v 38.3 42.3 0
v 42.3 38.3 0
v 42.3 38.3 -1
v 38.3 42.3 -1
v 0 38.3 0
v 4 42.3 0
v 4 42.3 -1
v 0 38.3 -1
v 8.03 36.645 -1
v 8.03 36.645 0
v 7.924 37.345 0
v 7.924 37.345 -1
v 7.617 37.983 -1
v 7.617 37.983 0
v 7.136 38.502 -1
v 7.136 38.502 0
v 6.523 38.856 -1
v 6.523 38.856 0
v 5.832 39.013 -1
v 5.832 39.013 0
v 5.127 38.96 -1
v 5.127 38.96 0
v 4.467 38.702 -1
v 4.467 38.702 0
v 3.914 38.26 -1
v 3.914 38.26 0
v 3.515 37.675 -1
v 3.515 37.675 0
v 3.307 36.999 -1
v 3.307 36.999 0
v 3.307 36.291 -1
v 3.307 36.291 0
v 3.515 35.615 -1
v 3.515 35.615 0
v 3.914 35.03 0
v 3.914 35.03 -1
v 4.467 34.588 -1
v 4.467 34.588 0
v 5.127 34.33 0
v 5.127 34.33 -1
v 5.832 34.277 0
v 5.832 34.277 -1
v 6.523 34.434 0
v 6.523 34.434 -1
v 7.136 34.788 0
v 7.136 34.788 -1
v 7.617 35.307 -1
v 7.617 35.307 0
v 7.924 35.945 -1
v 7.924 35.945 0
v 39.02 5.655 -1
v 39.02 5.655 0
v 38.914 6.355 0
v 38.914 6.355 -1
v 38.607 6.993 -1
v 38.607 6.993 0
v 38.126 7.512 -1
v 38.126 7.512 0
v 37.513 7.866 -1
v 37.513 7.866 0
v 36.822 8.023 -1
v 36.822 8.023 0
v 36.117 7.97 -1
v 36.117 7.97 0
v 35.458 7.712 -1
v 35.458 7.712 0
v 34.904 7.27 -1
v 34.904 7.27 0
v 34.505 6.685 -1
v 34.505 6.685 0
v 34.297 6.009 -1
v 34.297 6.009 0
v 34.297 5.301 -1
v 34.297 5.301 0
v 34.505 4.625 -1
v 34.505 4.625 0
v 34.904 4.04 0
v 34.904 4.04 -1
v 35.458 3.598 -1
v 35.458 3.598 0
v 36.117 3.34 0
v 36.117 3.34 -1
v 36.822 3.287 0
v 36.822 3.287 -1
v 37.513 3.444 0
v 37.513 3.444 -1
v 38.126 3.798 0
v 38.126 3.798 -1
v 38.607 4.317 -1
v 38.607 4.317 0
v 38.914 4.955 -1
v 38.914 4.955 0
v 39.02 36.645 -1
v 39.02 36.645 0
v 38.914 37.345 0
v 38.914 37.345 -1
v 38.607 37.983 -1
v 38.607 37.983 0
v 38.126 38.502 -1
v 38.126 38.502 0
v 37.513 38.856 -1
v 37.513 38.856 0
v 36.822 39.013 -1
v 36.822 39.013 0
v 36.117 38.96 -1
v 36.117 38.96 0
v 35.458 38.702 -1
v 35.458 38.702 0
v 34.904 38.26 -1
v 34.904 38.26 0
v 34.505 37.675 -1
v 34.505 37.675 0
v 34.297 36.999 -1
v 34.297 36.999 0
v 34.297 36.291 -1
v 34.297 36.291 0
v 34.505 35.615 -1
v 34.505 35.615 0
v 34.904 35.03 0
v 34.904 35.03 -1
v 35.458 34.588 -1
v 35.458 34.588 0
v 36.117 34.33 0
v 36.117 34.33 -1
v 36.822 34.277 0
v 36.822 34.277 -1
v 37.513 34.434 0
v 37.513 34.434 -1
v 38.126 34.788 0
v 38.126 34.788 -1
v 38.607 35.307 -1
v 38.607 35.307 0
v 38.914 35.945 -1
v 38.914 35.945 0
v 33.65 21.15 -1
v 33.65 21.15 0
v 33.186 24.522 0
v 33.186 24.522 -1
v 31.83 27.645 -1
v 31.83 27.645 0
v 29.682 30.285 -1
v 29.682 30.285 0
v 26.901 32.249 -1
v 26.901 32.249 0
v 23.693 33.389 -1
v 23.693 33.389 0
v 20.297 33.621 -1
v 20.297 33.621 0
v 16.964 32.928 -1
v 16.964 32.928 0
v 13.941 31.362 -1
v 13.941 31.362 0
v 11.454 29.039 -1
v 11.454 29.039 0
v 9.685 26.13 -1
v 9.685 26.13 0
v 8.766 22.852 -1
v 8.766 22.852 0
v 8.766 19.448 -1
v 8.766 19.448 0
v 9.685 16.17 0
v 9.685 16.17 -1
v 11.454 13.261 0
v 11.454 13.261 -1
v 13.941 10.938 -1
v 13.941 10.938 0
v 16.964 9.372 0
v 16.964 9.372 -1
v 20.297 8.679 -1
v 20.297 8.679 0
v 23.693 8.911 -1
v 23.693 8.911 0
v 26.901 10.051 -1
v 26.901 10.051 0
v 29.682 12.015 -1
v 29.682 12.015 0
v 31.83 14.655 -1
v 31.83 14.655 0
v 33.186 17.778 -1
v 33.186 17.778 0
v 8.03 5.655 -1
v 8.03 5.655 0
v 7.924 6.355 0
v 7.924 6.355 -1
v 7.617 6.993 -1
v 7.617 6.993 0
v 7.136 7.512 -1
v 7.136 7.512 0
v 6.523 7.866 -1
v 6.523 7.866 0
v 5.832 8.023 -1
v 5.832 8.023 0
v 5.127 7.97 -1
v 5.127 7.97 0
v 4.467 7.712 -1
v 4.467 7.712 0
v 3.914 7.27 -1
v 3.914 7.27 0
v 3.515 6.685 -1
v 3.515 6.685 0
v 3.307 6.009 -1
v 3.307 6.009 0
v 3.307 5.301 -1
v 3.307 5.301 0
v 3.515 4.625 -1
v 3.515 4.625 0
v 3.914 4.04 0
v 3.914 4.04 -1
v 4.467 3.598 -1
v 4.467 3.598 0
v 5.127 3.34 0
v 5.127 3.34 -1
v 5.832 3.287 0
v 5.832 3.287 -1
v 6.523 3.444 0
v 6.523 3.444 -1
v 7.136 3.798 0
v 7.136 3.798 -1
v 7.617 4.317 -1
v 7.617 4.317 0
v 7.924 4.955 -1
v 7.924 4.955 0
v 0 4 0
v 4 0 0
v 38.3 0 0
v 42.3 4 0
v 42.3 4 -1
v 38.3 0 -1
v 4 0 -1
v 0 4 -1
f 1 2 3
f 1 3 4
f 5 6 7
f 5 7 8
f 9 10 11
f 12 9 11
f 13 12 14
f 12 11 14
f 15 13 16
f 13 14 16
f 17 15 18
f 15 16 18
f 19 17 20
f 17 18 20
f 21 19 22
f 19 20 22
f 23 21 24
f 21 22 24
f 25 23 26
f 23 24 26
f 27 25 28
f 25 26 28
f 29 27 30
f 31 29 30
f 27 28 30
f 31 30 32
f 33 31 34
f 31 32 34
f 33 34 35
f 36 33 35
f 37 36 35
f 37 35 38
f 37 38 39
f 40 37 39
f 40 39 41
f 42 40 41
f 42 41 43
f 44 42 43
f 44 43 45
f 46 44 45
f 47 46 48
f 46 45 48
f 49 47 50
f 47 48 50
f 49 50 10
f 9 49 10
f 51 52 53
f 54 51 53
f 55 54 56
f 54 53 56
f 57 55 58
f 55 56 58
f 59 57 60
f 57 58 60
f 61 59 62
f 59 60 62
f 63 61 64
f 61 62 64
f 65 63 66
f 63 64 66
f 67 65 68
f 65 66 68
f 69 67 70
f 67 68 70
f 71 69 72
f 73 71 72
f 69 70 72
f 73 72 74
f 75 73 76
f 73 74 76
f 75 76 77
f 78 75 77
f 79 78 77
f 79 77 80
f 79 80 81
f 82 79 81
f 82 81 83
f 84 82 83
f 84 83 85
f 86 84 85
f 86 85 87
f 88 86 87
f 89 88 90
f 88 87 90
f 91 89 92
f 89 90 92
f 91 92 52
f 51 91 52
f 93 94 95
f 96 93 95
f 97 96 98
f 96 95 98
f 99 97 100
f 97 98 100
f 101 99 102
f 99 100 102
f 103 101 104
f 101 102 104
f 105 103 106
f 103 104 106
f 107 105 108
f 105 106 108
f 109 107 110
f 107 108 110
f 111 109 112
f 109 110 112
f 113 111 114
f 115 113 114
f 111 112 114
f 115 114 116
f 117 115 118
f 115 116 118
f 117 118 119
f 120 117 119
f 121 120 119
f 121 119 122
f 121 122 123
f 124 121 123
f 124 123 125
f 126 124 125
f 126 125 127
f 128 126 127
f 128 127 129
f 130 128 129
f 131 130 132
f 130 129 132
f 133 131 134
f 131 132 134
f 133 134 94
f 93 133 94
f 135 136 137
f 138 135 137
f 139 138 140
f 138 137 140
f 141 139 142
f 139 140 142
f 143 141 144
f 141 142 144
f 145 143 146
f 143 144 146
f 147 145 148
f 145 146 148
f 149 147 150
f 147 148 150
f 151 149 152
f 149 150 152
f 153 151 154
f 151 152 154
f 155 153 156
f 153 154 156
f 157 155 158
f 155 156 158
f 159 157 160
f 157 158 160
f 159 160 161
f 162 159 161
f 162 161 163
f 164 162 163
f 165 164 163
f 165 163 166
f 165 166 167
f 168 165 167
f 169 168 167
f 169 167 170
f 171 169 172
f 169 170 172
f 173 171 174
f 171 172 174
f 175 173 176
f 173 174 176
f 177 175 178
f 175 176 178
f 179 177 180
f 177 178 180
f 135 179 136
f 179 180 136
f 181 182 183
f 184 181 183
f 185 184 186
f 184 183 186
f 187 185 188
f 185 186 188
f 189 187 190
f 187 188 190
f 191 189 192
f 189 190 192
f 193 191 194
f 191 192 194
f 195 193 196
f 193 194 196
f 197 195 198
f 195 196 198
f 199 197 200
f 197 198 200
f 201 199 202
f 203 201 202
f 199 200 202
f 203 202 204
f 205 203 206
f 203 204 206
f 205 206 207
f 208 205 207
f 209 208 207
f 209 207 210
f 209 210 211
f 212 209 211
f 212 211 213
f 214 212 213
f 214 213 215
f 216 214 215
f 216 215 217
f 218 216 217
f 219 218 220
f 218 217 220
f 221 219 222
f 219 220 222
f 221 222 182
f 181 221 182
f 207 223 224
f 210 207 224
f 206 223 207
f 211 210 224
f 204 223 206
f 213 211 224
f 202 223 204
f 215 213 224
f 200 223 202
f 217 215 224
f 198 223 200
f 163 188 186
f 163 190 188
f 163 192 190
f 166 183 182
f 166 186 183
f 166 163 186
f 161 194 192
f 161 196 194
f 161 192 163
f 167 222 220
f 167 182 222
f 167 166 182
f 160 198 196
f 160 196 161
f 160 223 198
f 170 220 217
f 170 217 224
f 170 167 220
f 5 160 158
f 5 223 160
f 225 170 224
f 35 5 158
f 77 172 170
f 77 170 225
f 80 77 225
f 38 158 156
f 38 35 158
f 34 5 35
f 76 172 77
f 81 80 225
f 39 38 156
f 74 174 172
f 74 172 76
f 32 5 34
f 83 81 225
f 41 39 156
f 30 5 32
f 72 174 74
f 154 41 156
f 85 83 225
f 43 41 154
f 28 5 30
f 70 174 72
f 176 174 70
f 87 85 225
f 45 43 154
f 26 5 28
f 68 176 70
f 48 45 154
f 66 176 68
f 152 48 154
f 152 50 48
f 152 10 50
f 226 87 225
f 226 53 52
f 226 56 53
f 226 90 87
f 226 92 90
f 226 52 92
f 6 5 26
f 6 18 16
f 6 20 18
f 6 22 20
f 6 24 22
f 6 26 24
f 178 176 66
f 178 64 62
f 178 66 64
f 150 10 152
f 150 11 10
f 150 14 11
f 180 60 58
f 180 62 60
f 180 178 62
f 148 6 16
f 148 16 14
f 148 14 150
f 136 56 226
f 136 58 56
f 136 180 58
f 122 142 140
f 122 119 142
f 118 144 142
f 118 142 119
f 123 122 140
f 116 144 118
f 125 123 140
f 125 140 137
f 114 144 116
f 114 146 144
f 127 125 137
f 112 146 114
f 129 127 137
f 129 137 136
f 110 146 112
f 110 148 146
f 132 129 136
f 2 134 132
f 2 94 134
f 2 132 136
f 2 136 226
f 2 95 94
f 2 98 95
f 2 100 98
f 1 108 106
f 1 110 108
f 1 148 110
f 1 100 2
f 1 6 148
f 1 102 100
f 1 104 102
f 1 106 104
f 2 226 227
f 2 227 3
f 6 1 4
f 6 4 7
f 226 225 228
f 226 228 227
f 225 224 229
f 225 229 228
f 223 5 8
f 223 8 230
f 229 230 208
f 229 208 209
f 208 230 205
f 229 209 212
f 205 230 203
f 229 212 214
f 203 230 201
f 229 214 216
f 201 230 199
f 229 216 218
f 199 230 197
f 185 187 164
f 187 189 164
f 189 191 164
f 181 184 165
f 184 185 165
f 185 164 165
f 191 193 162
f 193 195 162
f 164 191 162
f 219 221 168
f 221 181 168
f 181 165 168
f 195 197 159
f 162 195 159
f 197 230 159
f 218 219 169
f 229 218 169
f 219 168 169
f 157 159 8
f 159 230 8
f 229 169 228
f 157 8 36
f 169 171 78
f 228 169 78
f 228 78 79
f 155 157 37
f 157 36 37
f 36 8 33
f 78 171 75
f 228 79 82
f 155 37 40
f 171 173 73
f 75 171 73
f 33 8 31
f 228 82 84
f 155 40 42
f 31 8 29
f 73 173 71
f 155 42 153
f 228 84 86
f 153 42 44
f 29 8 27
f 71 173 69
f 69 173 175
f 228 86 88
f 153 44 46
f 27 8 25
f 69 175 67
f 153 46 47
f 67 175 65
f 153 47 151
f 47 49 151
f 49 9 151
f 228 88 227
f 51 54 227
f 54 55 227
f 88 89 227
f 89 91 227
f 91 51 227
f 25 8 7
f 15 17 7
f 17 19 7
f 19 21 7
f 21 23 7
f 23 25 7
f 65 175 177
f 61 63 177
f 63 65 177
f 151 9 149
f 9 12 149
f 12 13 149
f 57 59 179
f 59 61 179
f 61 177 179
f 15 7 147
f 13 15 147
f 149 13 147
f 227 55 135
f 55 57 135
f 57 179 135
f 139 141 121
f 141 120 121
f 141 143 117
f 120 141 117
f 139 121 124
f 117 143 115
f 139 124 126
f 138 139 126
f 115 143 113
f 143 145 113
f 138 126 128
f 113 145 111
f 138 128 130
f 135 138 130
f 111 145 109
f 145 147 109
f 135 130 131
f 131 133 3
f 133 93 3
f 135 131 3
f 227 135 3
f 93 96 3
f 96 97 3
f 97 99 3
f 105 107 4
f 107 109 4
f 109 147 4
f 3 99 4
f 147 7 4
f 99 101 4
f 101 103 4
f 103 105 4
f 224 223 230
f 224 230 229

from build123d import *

# Parameters (mm, degrees)
F0_R     = 2.375
F0_R_2   = 12.5
F1_DEPTH = 1


with BuildPart() as f1:
    # F0 (on Top) → F1 (new body)
    with BuildSketch(Plane.XY):
        Polygon((0, 4), (4, 0), (38.3, 0), (42.3, 4), (42.3, 38.3), (38.3, 42.3), (4, 42.3), (0, 38.3), align=None)
        with Locations((5.655, 5.655)):
            Circle(F0_R, mode=Mode.SUBTRACT)
        with Locations((36.645, 5.655)):
            Circle(F0_R, mode=Mode.SUBTRACT)
        with Locations((5.655, 36.645)):
            Circle(F0_R, mode=Mode.SUBTRACT)
        with Locations((21.15, 21.15)):
            Circle(F0_R_2, mode=Mode.SUBTRACT)
        with Locations((36.645, 36.645)):
            Circle(F0_R, mode=Mode.SUBTRACT)
    extrude(amount=-F1_DEPTH)


solid = f1.part
